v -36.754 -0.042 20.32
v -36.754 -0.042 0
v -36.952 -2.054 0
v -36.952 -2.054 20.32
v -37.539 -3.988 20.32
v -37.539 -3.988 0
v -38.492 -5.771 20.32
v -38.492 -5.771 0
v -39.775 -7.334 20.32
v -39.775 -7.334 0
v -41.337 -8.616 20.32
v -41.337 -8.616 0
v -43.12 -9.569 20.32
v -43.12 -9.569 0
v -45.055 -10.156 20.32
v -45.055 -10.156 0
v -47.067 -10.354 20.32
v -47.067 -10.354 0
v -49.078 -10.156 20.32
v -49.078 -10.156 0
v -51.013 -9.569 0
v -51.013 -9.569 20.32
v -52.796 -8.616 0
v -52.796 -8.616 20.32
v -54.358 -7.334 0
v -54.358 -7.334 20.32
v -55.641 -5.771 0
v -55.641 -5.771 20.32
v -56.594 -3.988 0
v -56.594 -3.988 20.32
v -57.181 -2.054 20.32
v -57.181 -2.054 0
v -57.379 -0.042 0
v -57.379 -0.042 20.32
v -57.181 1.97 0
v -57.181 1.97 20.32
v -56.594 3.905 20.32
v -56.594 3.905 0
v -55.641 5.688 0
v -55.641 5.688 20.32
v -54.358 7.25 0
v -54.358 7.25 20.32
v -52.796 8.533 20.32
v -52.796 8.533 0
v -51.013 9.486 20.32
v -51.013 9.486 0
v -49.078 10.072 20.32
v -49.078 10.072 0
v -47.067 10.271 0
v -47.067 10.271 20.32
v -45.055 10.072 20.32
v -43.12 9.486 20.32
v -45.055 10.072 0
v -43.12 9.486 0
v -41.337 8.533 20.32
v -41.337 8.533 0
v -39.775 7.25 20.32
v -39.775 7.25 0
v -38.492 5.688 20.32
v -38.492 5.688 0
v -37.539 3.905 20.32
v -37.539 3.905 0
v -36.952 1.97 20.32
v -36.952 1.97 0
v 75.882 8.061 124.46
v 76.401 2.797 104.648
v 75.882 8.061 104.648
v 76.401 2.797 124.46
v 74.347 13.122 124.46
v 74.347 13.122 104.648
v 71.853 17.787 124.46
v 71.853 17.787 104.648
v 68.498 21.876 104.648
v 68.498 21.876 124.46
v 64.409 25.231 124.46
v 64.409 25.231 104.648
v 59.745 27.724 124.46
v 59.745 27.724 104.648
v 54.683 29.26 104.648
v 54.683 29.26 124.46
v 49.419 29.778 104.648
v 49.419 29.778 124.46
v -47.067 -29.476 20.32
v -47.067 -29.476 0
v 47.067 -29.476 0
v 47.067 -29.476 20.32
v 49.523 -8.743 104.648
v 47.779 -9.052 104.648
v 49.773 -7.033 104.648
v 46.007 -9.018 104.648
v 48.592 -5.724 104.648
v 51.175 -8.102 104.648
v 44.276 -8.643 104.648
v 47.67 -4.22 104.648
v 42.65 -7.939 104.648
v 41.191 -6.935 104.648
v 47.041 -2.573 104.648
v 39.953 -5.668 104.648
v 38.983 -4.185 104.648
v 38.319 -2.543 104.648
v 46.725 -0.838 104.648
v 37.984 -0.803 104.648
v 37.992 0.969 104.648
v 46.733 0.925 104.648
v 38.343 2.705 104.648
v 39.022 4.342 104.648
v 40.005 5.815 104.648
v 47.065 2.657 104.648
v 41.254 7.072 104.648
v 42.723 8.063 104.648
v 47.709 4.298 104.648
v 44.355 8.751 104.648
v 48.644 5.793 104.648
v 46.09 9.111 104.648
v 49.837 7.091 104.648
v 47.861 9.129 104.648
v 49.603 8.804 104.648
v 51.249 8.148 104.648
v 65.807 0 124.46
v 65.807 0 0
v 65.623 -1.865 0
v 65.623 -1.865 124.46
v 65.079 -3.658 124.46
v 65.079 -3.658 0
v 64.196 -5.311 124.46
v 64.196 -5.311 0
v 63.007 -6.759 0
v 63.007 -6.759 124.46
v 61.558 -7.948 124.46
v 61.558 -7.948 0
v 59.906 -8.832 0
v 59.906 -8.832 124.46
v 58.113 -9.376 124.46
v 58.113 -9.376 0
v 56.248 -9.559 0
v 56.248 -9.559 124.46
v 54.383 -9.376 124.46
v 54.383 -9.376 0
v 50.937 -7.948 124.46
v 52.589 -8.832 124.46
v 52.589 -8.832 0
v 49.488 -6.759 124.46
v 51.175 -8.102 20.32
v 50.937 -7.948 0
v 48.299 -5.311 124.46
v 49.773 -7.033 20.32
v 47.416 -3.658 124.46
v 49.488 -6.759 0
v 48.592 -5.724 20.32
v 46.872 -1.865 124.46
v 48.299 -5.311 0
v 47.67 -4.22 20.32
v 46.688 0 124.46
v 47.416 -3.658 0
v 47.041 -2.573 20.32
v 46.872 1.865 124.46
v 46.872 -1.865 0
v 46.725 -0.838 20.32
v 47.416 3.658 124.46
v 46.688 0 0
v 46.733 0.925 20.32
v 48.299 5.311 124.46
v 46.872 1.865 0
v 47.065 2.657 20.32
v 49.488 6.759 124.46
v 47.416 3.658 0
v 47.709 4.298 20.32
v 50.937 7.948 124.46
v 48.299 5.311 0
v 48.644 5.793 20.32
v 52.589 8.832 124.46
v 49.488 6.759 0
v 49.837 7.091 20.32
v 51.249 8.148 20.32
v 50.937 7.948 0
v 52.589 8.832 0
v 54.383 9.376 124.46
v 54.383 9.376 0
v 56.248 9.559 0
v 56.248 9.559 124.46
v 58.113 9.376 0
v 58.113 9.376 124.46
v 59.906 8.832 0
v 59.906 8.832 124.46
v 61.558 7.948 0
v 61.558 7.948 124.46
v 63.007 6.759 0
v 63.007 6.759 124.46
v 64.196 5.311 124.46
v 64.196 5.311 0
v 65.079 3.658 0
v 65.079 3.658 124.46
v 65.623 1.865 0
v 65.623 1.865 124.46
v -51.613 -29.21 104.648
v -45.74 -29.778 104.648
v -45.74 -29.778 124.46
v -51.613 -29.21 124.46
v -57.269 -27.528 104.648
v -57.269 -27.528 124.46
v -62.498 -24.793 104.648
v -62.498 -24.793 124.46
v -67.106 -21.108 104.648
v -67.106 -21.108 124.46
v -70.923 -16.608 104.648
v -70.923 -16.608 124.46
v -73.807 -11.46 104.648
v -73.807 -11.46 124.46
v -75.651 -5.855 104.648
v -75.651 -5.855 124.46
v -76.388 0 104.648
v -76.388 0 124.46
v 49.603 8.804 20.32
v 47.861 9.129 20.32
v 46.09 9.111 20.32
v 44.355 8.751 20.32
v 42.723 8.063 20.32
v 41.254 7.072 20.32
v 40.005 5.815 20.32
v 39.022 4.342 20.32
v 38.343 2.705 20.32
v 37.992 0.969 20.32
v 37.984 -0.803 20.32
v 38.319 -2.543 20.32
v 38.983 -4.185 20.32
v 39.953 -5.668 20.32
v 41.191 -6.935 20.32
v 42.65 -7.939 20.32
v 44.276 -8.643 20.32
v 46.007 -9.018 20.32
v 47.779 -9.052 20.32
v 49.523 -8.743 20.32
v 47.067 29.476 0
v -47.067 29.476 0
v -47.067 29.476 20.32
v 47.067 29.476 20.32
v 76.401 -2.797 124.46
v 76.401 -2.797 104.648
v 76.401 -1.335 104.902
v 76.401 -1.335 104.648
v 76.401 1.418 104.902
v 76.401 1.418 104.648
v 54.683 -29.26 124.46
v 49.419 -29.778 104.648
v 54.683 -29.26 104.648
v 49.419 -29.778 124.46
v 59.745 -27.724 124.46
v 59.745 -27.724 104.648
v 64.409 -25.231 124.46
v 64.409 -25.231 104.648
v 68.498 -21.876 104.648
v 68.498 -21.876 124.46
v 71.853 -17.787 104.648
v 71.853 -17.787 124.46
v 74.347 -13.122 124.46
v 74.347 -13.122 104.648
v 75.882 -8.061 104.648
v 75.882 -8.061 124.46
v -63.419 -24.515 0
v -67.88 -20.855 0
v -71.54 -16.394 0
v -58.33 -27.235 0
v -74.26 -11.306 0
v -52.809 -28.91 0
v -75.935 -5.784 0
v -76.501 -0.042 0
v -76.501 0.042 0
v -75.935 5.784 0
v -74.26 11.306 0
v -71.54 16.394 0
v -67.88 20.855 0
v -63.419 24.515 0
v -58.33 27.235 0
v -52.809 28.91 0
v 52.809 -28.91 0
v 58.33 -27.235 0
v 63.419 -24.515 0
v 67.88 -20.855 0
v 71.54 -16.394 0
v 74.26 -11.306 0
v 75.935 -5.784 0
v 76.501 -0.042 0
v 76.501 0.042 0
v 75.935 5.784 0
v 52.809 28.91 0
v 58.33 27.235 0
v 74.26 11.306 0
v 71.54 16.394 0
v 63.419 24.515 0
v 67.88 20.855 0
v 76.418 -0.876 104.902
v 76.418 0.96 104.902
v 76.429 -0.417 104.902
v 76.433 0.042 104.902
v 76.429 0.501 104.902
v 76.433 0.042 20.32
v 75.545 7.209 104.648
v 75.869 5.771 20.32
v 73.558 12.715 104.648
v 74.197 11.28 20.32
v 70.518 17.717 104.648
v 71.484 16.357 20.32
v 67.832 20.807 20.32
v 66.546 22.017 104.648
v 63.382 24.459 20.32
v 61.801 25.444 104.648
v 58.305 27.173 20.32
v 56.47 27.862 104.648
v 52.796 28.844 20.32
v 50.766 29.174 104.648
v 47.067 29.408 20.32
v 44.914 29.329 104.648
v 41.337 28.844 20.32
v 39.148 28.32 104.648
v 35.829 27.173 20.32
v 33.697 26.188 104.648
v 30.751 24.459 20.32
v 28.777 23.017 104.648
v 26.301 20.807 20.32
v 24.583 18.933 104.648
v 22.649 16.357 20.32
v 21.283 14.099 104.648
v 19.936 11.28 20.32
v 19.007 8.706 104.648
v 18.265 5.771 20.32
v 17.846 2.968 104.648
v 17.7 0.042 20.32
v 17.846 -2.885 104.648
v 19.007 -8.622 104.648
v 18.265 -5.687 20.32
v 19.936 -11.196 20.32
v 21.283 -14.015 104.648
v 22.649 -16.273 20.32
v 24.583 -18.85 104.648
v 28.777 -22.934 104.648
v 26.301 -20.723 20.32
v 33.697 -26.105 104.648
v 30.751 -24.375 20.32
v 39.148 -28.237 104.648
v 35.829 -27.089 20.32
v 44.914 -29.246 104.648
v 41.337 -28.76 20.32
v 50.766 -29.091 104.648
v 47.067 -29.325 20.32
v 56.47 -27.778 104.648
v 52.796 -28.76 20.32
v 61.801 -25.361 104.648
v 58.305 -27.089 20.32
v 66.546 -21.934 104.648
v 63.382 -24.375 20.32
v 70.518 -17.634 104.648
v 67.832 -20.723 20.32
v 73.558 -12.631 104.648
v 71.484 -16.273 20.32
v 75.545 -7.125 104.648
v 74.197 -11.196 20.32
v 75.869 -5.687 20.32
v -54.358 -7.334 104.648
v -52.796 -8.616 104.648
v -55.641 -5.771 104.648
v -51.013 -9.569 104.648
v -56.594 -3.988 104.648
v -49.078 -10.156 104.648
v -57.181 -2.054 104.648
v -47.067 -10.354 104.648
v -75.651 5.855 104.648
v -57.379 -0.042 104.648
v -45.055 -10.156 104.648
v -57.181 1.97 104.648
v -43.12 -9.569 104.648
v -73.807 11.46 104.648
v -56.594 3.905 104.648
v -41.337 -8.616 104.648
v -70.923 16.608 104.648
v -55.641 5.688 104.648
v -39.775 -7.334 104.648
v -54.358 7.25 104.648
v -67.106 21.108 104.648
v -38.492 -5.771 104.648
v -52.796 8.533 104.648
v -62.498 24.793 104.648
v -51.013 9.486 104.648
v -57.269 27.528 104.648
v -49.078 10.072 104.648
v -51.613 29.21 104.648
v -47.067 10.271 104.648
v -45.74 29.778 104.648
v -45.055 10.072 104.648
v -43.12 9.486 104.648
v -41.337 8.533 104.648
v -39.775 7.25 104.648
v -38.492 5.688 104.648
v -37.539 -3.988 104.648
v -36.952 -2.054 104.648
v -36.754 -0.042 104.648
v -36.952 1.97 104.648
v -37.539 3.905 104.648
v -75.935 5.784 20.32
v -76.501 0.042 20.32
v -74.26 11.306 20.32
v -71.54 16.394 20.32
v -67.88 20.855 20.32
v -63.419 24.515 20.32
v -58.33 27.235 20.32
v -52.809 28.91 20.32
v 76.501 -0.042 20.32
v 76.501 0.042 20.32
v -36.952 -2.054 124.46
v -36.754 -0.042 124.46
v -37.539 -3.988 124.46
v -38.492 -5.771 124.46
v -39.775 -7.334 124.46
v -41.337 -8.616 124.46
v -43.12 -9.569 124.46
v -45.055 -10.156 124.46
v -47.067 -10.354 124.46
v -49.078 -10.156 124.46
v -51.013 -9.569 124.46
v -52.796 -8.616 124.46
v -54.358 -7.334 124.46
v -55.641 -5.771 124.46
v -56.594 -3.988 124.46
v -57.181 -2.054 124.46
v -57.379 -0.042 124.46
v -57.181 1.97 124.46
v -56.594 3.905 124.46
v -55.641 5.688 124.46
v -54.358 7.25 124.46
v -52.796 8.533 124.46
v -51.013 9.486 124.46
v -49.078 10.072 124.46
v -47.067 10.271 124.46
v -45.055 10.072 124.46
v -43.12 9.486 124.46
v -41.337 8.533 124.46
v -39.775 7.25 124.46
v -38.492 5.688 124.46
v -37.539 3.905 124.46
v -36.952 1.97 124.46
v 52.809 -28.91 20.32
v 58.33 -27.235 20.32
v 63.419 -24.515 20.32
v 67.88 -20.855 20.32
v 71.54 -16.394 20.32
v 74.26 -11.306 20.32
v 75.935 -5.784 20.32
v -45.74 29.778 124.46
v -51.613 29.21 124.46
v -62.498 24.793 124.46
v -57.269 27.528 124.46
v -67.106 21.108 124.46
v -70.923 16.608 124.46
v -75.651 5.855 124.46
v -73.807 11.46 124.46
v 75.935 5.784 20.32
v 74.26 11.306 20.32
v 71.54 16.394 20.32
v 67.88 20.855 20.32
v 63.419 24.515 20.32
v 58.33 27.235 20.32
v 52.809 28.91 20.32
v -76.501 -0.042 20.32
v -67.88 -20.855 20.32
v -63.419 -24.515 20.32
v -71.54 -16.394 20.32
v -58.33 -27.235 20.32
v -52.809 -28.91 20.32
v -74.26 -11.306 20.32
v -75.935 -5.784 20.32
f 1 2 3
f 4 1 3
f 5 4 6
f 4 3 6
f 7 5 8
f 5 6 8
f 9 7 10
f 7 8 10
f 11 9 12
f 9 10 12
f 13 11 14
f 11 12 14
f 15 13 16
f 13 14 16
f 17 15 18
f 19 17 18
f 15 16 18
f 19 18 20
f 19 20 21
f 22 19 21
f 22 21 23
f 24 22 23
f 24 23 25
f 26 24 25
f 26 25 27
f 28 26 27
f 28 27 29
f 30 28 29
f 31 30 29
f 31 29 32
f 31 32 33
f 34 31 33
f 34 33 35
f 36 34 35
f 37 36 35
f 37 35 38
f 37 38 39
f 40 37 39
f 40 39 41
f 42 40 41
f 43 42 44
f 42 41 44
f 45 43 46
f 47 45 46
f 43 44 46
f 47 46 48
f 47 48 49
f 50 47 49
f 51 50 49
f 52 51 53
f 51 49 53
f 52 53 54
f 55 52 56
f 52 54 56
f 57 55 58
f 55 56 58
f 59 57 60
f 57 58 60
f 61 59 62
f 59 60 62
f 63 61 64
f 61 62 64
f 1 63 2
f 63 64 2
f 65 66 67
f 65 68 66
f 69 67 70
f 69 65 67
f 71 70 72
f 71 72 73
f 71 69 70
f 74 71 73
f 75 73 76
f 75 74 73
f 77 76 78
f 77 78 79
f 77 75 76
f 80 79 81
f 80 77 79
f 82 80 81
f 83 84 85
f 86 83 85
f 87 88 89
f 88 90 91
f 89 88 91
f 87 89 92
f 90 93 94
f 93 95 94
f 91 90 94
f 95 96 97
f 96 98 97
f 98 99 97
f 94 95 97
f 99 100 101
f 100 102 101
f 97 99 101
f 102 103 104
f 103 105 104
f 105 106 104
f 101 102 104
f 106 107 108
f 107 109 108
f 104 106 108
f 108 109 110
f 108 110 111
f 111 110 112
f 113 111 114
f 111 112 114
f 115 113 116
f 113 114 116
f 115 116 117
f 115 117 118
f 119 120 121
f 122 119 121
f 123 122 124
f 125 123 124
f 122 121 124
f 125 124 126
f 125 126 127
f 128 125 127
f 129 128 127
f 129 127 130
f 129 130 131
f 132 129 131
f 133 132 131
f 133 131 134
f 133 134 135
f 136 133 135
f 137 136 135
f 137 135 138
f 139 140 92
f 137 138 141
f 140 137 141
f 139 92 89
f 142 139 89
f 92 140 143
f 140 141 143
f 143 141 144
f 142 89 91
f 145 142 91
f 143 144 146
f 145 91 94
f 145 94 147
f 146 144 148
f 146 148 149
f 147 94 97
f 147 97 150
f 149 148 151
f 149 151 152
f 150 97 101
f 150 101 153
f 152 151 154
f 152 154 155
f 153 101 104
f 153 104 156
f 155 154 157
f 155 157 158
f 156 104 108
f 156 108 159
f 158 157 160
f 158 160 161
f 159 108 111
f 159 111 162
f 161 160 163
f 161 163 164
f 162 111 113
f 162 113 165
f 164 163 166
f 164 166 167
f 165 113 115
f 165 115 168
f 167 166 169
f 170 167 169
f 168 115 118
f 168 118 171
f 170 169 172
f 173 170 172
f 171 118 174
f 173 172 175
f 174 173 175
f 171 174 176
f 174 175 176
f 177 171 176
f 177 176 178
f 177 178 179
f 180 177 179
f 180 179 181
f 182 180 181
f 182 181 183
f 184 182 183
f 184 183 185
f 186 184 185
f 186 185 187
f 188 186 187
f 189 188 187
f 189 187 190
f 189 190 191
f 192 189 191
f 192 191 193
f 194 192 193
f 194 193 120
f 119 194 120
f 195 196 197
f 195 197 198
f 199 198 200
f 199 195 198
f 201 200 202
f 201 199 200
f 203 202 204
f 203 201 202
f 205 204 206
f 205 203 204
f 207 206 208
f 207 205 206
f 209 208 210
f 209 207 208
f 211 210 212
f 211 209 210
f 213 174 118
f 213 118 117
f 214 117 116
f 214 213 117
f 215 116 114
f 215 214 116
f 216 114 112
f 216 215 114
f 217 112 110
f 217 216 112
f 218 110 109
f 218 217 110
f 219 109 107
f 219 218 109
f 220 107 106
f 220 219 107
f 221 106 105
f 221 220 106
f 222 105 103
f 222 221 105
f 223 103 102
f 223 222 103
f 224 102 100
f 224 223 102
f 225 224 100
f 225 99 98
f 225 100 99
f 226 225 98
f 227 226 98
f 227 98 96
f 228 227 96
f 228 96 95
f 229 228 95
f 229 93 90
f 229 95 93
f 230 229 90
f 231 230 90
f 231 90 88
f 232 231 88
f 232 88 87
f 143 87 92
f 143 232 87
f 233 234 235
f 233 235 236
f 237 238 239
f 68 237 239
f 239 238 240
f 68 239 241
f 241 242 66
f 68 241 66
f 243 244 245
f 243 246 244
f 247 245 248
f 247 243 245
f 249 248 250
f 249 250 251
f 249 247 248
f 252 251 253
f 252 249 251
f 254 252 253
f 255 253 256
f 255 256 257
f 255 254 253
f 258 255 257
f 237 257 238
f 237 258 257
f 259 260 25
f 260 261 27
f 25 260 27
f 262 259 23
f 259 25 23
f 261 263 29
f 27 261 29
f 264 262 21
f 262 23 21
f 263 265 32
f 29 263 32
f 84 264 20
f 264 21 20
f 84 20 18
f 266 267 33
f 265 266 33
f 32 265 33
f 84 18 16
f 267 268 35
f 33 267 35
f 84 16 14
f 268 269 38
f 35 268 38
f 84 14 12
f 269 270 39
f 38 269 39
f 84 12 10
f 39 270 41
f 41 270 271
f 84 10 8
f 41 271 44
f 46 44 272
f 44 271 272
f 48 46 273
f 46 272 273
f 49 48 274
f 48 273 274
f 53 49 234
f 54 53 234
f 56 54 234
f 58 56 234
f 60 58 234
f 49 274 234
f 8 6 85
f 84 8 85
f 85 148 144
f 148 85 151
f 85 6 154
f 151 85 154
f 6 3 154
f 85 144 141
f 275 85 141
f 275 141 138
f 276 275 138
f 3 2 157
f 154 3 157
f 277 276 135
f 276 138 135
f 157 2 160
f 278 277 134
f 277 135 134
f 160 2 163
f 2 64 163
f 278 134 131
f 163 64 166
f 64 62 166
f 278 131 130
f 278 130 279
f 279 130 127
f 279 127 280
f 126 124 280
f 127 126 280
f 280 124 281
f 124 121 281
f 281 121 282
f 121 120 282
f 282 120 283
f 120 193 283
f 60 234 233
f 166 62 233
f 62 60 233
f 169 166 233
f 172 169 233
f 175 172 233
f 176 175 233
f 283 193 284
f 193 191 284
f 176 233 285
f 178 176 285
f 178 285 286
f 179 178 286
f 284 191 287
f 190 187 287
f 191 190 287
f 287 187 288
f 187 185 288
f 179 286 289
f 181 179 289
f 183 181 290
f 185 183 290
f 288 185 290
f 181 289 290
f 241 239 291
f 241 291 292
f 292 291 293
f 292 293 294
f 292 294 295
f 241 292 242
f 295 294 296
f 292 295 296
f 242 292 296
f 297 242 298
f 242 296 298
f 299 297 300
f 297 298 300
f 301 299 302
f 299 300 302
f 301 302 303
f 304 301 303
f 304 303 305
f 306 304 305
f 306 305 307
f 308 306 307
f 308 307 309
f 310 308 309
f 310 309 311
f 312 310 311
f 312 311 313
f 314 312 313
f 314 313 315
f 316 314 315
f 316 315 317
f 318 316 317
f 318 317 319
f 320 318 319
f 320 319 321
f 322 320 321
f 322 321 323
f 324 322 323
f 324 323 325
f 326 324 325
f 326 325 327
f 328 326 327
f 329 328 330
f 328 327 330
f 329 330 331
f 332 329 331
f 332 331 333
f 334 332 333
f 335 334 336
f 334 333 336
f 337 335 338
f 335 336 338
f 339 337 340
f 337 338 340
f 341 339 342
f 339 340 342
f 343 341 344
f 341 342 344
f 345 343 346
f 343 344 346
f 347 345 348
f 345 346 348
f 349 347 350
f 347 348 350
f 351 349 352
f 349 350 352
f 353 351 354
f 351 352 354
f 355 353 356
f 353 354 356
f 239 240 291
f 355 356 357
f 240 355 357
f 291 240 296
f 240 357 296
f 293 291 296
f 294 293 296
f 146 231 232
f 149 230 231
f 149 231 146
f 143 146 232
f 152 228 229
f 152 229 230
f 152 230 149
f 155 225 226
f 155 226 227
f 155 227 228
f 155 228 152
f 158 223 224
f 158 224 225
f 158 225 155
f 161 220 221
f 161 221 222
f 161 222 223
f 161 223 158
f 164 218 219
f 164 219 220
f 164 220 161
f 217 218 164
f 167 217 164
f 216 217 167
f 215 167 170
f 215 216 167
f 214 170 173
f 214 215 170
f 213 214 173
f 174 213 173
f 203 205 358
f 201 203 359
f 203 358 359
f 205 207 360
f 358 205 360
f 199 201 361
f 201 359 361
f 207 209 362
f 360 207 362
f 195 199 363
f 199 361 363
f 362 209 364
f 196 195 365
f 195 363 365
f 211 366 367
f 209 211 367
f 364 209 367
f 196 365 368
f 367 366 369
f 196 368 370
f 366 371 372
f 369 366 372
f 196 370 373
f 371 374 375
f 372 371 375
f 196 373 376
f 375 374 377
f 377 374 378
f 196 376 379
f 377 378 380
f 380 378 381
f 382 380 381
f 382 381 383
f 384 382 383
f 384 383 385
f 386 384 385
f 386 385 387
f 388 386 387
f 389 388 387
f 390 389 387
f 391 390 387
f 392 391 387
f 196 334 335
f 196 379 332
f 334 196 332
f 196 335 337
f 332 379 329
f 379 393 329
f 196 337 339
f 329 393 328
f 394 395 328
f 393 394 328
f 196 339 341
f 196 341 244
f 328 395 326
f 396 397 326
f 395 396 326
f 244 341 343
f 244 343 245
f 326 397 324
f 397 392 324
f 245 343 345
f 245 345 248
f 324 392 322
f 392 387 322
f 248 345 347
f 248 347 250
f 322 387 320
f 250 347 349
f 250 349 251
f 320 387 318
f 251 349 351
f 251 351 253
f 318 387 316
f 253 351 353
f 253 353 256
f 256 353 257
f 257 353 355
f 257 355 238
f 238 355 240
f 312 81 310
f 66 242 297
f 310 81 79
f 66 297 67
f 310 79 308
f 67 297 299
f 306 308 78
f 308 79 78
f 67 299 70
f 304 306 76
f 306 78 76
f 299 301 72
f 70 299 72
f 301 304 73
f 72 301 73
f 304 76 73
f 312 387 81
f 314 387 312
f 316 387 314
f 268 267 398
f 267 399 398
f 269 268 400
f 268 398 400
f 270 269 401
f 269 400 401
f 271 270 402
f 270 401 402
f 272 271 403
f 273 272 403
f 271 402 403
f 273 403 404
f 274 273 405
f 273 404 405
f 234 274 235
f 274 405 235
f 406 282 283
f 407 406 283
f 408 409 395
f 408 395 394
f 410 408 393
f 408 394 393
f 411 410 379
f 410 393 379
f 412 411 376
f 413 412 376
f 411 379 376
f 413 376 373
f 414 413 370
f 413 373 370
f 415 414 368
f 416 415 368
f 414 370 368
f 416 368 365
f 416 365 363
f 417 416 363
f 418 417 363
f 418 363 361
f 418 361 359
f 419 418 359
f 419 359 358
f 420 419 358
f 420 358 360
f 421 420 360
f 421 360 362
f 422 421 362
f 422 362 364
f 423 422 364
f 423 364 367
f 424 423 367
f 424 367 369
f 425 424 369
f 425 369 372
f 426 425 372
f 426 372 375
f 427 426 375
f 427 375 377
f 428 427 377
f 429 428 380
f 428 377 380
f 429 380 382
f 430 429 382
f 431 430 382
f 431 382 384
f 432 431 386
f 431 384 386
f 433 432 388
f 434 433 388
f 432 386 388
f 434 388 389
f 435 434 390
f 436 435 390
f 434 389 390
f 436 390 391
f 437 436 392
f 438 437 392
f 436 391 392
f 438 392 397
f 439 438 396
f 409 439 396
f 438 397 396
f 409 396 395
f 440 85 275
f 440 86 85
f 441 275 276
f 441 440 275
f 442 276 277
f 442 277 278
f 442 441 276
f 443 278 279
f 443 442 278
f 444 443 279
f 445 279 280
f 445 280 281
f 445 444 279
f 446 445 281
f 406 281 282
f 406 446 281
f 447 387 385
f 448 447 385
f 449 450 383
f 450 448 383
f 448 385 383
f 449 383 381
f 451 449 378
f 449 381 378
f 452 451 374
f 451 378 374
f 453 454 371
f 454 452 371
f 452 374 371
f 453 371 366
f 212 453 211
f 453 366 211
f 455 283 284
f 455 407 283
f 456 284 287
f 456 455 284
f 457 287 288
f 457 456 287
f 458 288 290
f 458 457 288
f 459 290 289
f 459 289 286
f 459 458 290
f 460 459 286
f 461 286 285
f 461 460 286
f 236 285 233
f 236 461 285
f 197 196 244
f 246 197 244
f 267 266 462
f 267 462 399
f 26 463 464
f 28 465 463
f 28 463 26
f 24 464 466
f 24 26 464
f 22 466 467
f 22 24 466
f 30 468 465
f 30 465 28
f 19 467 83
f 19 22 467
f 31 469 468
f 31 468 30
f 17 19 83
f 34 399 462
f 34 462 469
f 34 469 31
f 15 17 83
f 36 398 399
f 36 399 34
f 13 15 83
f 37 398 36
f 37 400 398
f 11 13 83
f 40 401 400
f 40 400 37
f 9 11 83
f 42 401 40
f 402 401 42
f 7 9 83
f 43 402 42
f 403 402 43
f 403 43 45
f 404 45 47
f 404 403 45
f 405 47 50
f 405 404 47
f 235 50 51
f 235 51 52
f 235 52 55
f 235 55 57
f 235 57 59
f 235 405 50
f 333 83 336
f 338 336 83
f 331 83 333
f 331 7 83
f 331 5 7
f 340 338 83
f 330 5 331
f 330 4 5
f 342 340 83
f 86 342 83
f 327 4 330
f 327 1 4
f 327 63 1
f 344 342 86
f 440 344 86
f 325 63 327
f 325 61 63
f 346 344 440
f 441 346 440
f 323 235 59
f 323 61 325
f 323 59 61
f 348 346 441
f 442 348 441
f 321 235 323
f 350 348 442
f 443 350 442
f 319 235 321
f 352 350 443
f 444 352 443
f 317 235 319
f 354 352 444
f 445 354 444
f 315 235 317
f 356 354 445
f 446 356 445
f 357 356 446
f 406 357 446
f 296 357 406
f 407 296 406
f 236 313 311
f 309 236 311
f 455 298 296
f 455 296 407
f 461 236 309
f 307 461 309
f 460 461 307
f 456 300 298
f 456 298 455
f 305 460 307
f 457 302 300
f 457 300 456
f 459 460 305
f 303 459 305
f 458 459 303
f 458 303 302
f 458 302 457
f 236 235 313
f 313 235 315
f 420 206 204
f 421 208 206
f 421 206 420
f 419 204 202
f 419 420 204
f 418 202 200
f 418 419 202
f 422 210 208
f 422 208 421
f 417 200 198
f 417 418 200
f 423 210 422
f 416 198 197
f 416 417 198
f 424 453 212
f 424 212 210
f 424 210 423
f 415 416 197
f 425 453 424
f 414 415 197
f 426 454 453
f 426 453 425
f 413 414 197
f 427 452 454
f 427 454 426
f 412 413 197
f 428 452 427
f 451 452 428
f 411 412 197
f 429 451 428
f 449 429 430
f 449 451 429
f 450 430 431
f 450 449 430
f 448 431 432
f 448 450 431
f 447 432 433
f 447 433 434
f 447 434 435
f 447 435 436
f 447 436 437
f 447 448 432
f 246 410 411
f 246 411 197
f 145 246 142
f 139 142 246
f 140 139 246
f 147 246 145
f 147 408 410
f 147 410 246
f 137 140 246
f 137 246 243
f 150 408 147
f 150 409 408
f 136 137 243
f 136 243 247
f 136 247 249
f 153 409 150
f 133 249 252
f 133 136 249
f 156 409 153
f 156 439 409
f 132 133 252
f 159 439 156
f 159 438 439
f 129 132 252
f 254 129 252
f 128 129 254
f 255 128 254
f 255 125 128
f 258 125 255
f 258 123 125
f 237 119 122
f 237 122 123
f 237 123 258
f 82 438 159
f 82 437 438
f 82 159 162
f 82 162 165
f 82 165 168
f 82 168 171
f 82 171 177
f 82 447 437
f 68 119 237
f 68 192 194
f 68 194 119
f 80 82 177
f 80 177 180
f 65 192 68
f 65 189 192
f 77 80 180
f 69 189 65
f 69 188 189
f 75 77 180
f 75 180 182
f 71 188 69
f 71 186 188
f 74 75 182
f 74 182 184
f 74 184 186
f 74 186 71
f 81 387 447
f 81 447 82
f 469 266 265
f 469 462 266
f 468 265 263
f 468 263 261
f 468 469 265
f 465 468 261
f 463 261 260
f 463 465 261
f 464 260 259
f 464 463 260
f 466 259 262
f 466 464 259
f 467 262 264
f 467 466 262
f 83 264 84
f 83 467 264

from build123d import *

# Parameters (mm, degrees)
F0_W         = 153.0012339354
F0_H         = 58.951575309
F1_DEPTH     = 20.32
F2_R         = 29.4340917525
F3_R         = 29.3662882484
F3_R_2       = 9.1215869303
F4_DEPTH     = 84.582
F5_DEPTH     = 84.583
F6_R         = 12.0800155098
F7_DEPTH     = 84.583
F9_W         = 152.801066637
F9_H         = 59.5563165843
F10_DEPTH    = 19.812
F11_R        = 10.3122867818
F12_DEPTH    = 124.461
F13_T1_DEPTH = 173.1145612107
F14_R        = 26.9812507731
F15_R        = 9.5592417263
F16_DEPTH    = 124.461


# Not quite as in the source:
# - a fillet or chamfer that OpenCascade refuses, or shapes differently, is made with other operations: its cross-section is extruded or revolved along the edge and cut away or added


with BuildPart() as f1:
    # F0 (on Top) → F1 (new body)
    with BuildSketch(Plane.XY):
        Rectangle(F0_W, F0_H)
    extrude(amount=F1_DEPTH)

    # F2
    f2_edges = [f1.edges().sort_by_distance(p)[0] for p in [
        (-76.500617, -29.475788, 10.16),
        (-76.500617, 29.475788, 10.16),
        (76.500617, -29.475788, 10.16),
        (76.500617, 29.475788, 10.16),
    ]]
    fillet(f2_edges, radius=F2_R)

    # F3 (on face) → F4 (join)
    with BuildSketch(Plane.XY.offset(20.32)):
        with Locations((47.0665252152, 0.0416959021)):
            Circle(F3_R)
        with Locations((47.0665252152, 0.0416959021)):
            Circle(F3_R_2, mode=Mode.SUBTRACT)
    extrude(amount=F4_DEPTH)

    # F5 (cut, through all): a face of the model
    f5_faces = [f1.faces().sort_by_distance(p)[0] for p in [
        (47.0665252152, 0.0416959021, 20.32),
    ]]
    extrude(f5_faces, amount=F5_DEPTH, mode=Mode.SUBTRACT)

    # F6 (on face) → F7 (cut, through all)
    with BuildSketch(Plane.XY.offset(20.32)):
        with Locations((-47.0665252152, 0.0416959021)):
            Circle(F6_R)
    extrude(amount=F7_DEPTH, mode=Mode.SUBTRACT)

    # F9 (on offset) → F10 (join)
    with BuildSketch(Plane.XY.offset(104.648)):
        Rectangle(F9_W, F9_H)
    extrude(amount=F10_DEPTH)

    # F11 (on face) → F12 (cut, through all)
    with BuildSketch(Plane(origin=(0, 0, 0), x_dir=(1, 0, 0), z_dir=(0, 0, -1))):
        with Locations((-47.0665252152, 0.0416959021)):
            Circle(F11_R)
    extrude(amount=-F12_DEPTH, mode=Mode.SUBTRACT)

    # F13: fillet of radius 30.6605122421 on 2 edges, made by hand

    # F13_s2 → F13_t1 (cut)
    with BuildSketch(Plane.XY.offset(27.9967193947)):
        with BuildLine():
            ThreePointArc((-45.7400210764, -29.7781582922), (-67.4202771975, -20.7979021711), (-76.4005333185, 0.88235395))
            Line((-76.4005333185, 0.88235395), (-76.4005333185, -29.7781582922))
            Line((-76.4005333185, -29.7781582922), (-45.7400210764, -29.7781582922))
        make_face()
        with BuildLine():
            ThreePointArc((-45.7400210764, 29.7781582922), (-67.4202771975, 20.7979021711), (-76.4005333185, -0.88235395))
            Line((-76.4005333185, -0.88235395), (-76.4005333185, 29.7781582922))
            Line((-76.4005333185, 29.7781582922), (-45.7400210764, 29.7781582922))
        make_face()
    extrude(amount=F13_T1_DEPTH, mode=Mode.SUBTRACT)

    # F14
    f14_edges = [f1.edges().sort_by_distance(p)[0] for p in [
        (76.400533, -29.778158, 114.554),
        (76.400533, 29.778158, 114.554),
    ]]
    fillet(f14_edges, radius=F14_R)

    # F15 (on face) → F16 (cut, through all)
    with BuildSketch(Plane(origin=(0, 0, 0), x_dir=(1, 0, 0), z_dir=(0, 0, -1))):
        with Locations((56.2476292253, 0)):
            Circle(F15_R)
    extrude(amount=-F16_DEPTH, mode=Mode.SUBTRACT)


solid = f1.part
